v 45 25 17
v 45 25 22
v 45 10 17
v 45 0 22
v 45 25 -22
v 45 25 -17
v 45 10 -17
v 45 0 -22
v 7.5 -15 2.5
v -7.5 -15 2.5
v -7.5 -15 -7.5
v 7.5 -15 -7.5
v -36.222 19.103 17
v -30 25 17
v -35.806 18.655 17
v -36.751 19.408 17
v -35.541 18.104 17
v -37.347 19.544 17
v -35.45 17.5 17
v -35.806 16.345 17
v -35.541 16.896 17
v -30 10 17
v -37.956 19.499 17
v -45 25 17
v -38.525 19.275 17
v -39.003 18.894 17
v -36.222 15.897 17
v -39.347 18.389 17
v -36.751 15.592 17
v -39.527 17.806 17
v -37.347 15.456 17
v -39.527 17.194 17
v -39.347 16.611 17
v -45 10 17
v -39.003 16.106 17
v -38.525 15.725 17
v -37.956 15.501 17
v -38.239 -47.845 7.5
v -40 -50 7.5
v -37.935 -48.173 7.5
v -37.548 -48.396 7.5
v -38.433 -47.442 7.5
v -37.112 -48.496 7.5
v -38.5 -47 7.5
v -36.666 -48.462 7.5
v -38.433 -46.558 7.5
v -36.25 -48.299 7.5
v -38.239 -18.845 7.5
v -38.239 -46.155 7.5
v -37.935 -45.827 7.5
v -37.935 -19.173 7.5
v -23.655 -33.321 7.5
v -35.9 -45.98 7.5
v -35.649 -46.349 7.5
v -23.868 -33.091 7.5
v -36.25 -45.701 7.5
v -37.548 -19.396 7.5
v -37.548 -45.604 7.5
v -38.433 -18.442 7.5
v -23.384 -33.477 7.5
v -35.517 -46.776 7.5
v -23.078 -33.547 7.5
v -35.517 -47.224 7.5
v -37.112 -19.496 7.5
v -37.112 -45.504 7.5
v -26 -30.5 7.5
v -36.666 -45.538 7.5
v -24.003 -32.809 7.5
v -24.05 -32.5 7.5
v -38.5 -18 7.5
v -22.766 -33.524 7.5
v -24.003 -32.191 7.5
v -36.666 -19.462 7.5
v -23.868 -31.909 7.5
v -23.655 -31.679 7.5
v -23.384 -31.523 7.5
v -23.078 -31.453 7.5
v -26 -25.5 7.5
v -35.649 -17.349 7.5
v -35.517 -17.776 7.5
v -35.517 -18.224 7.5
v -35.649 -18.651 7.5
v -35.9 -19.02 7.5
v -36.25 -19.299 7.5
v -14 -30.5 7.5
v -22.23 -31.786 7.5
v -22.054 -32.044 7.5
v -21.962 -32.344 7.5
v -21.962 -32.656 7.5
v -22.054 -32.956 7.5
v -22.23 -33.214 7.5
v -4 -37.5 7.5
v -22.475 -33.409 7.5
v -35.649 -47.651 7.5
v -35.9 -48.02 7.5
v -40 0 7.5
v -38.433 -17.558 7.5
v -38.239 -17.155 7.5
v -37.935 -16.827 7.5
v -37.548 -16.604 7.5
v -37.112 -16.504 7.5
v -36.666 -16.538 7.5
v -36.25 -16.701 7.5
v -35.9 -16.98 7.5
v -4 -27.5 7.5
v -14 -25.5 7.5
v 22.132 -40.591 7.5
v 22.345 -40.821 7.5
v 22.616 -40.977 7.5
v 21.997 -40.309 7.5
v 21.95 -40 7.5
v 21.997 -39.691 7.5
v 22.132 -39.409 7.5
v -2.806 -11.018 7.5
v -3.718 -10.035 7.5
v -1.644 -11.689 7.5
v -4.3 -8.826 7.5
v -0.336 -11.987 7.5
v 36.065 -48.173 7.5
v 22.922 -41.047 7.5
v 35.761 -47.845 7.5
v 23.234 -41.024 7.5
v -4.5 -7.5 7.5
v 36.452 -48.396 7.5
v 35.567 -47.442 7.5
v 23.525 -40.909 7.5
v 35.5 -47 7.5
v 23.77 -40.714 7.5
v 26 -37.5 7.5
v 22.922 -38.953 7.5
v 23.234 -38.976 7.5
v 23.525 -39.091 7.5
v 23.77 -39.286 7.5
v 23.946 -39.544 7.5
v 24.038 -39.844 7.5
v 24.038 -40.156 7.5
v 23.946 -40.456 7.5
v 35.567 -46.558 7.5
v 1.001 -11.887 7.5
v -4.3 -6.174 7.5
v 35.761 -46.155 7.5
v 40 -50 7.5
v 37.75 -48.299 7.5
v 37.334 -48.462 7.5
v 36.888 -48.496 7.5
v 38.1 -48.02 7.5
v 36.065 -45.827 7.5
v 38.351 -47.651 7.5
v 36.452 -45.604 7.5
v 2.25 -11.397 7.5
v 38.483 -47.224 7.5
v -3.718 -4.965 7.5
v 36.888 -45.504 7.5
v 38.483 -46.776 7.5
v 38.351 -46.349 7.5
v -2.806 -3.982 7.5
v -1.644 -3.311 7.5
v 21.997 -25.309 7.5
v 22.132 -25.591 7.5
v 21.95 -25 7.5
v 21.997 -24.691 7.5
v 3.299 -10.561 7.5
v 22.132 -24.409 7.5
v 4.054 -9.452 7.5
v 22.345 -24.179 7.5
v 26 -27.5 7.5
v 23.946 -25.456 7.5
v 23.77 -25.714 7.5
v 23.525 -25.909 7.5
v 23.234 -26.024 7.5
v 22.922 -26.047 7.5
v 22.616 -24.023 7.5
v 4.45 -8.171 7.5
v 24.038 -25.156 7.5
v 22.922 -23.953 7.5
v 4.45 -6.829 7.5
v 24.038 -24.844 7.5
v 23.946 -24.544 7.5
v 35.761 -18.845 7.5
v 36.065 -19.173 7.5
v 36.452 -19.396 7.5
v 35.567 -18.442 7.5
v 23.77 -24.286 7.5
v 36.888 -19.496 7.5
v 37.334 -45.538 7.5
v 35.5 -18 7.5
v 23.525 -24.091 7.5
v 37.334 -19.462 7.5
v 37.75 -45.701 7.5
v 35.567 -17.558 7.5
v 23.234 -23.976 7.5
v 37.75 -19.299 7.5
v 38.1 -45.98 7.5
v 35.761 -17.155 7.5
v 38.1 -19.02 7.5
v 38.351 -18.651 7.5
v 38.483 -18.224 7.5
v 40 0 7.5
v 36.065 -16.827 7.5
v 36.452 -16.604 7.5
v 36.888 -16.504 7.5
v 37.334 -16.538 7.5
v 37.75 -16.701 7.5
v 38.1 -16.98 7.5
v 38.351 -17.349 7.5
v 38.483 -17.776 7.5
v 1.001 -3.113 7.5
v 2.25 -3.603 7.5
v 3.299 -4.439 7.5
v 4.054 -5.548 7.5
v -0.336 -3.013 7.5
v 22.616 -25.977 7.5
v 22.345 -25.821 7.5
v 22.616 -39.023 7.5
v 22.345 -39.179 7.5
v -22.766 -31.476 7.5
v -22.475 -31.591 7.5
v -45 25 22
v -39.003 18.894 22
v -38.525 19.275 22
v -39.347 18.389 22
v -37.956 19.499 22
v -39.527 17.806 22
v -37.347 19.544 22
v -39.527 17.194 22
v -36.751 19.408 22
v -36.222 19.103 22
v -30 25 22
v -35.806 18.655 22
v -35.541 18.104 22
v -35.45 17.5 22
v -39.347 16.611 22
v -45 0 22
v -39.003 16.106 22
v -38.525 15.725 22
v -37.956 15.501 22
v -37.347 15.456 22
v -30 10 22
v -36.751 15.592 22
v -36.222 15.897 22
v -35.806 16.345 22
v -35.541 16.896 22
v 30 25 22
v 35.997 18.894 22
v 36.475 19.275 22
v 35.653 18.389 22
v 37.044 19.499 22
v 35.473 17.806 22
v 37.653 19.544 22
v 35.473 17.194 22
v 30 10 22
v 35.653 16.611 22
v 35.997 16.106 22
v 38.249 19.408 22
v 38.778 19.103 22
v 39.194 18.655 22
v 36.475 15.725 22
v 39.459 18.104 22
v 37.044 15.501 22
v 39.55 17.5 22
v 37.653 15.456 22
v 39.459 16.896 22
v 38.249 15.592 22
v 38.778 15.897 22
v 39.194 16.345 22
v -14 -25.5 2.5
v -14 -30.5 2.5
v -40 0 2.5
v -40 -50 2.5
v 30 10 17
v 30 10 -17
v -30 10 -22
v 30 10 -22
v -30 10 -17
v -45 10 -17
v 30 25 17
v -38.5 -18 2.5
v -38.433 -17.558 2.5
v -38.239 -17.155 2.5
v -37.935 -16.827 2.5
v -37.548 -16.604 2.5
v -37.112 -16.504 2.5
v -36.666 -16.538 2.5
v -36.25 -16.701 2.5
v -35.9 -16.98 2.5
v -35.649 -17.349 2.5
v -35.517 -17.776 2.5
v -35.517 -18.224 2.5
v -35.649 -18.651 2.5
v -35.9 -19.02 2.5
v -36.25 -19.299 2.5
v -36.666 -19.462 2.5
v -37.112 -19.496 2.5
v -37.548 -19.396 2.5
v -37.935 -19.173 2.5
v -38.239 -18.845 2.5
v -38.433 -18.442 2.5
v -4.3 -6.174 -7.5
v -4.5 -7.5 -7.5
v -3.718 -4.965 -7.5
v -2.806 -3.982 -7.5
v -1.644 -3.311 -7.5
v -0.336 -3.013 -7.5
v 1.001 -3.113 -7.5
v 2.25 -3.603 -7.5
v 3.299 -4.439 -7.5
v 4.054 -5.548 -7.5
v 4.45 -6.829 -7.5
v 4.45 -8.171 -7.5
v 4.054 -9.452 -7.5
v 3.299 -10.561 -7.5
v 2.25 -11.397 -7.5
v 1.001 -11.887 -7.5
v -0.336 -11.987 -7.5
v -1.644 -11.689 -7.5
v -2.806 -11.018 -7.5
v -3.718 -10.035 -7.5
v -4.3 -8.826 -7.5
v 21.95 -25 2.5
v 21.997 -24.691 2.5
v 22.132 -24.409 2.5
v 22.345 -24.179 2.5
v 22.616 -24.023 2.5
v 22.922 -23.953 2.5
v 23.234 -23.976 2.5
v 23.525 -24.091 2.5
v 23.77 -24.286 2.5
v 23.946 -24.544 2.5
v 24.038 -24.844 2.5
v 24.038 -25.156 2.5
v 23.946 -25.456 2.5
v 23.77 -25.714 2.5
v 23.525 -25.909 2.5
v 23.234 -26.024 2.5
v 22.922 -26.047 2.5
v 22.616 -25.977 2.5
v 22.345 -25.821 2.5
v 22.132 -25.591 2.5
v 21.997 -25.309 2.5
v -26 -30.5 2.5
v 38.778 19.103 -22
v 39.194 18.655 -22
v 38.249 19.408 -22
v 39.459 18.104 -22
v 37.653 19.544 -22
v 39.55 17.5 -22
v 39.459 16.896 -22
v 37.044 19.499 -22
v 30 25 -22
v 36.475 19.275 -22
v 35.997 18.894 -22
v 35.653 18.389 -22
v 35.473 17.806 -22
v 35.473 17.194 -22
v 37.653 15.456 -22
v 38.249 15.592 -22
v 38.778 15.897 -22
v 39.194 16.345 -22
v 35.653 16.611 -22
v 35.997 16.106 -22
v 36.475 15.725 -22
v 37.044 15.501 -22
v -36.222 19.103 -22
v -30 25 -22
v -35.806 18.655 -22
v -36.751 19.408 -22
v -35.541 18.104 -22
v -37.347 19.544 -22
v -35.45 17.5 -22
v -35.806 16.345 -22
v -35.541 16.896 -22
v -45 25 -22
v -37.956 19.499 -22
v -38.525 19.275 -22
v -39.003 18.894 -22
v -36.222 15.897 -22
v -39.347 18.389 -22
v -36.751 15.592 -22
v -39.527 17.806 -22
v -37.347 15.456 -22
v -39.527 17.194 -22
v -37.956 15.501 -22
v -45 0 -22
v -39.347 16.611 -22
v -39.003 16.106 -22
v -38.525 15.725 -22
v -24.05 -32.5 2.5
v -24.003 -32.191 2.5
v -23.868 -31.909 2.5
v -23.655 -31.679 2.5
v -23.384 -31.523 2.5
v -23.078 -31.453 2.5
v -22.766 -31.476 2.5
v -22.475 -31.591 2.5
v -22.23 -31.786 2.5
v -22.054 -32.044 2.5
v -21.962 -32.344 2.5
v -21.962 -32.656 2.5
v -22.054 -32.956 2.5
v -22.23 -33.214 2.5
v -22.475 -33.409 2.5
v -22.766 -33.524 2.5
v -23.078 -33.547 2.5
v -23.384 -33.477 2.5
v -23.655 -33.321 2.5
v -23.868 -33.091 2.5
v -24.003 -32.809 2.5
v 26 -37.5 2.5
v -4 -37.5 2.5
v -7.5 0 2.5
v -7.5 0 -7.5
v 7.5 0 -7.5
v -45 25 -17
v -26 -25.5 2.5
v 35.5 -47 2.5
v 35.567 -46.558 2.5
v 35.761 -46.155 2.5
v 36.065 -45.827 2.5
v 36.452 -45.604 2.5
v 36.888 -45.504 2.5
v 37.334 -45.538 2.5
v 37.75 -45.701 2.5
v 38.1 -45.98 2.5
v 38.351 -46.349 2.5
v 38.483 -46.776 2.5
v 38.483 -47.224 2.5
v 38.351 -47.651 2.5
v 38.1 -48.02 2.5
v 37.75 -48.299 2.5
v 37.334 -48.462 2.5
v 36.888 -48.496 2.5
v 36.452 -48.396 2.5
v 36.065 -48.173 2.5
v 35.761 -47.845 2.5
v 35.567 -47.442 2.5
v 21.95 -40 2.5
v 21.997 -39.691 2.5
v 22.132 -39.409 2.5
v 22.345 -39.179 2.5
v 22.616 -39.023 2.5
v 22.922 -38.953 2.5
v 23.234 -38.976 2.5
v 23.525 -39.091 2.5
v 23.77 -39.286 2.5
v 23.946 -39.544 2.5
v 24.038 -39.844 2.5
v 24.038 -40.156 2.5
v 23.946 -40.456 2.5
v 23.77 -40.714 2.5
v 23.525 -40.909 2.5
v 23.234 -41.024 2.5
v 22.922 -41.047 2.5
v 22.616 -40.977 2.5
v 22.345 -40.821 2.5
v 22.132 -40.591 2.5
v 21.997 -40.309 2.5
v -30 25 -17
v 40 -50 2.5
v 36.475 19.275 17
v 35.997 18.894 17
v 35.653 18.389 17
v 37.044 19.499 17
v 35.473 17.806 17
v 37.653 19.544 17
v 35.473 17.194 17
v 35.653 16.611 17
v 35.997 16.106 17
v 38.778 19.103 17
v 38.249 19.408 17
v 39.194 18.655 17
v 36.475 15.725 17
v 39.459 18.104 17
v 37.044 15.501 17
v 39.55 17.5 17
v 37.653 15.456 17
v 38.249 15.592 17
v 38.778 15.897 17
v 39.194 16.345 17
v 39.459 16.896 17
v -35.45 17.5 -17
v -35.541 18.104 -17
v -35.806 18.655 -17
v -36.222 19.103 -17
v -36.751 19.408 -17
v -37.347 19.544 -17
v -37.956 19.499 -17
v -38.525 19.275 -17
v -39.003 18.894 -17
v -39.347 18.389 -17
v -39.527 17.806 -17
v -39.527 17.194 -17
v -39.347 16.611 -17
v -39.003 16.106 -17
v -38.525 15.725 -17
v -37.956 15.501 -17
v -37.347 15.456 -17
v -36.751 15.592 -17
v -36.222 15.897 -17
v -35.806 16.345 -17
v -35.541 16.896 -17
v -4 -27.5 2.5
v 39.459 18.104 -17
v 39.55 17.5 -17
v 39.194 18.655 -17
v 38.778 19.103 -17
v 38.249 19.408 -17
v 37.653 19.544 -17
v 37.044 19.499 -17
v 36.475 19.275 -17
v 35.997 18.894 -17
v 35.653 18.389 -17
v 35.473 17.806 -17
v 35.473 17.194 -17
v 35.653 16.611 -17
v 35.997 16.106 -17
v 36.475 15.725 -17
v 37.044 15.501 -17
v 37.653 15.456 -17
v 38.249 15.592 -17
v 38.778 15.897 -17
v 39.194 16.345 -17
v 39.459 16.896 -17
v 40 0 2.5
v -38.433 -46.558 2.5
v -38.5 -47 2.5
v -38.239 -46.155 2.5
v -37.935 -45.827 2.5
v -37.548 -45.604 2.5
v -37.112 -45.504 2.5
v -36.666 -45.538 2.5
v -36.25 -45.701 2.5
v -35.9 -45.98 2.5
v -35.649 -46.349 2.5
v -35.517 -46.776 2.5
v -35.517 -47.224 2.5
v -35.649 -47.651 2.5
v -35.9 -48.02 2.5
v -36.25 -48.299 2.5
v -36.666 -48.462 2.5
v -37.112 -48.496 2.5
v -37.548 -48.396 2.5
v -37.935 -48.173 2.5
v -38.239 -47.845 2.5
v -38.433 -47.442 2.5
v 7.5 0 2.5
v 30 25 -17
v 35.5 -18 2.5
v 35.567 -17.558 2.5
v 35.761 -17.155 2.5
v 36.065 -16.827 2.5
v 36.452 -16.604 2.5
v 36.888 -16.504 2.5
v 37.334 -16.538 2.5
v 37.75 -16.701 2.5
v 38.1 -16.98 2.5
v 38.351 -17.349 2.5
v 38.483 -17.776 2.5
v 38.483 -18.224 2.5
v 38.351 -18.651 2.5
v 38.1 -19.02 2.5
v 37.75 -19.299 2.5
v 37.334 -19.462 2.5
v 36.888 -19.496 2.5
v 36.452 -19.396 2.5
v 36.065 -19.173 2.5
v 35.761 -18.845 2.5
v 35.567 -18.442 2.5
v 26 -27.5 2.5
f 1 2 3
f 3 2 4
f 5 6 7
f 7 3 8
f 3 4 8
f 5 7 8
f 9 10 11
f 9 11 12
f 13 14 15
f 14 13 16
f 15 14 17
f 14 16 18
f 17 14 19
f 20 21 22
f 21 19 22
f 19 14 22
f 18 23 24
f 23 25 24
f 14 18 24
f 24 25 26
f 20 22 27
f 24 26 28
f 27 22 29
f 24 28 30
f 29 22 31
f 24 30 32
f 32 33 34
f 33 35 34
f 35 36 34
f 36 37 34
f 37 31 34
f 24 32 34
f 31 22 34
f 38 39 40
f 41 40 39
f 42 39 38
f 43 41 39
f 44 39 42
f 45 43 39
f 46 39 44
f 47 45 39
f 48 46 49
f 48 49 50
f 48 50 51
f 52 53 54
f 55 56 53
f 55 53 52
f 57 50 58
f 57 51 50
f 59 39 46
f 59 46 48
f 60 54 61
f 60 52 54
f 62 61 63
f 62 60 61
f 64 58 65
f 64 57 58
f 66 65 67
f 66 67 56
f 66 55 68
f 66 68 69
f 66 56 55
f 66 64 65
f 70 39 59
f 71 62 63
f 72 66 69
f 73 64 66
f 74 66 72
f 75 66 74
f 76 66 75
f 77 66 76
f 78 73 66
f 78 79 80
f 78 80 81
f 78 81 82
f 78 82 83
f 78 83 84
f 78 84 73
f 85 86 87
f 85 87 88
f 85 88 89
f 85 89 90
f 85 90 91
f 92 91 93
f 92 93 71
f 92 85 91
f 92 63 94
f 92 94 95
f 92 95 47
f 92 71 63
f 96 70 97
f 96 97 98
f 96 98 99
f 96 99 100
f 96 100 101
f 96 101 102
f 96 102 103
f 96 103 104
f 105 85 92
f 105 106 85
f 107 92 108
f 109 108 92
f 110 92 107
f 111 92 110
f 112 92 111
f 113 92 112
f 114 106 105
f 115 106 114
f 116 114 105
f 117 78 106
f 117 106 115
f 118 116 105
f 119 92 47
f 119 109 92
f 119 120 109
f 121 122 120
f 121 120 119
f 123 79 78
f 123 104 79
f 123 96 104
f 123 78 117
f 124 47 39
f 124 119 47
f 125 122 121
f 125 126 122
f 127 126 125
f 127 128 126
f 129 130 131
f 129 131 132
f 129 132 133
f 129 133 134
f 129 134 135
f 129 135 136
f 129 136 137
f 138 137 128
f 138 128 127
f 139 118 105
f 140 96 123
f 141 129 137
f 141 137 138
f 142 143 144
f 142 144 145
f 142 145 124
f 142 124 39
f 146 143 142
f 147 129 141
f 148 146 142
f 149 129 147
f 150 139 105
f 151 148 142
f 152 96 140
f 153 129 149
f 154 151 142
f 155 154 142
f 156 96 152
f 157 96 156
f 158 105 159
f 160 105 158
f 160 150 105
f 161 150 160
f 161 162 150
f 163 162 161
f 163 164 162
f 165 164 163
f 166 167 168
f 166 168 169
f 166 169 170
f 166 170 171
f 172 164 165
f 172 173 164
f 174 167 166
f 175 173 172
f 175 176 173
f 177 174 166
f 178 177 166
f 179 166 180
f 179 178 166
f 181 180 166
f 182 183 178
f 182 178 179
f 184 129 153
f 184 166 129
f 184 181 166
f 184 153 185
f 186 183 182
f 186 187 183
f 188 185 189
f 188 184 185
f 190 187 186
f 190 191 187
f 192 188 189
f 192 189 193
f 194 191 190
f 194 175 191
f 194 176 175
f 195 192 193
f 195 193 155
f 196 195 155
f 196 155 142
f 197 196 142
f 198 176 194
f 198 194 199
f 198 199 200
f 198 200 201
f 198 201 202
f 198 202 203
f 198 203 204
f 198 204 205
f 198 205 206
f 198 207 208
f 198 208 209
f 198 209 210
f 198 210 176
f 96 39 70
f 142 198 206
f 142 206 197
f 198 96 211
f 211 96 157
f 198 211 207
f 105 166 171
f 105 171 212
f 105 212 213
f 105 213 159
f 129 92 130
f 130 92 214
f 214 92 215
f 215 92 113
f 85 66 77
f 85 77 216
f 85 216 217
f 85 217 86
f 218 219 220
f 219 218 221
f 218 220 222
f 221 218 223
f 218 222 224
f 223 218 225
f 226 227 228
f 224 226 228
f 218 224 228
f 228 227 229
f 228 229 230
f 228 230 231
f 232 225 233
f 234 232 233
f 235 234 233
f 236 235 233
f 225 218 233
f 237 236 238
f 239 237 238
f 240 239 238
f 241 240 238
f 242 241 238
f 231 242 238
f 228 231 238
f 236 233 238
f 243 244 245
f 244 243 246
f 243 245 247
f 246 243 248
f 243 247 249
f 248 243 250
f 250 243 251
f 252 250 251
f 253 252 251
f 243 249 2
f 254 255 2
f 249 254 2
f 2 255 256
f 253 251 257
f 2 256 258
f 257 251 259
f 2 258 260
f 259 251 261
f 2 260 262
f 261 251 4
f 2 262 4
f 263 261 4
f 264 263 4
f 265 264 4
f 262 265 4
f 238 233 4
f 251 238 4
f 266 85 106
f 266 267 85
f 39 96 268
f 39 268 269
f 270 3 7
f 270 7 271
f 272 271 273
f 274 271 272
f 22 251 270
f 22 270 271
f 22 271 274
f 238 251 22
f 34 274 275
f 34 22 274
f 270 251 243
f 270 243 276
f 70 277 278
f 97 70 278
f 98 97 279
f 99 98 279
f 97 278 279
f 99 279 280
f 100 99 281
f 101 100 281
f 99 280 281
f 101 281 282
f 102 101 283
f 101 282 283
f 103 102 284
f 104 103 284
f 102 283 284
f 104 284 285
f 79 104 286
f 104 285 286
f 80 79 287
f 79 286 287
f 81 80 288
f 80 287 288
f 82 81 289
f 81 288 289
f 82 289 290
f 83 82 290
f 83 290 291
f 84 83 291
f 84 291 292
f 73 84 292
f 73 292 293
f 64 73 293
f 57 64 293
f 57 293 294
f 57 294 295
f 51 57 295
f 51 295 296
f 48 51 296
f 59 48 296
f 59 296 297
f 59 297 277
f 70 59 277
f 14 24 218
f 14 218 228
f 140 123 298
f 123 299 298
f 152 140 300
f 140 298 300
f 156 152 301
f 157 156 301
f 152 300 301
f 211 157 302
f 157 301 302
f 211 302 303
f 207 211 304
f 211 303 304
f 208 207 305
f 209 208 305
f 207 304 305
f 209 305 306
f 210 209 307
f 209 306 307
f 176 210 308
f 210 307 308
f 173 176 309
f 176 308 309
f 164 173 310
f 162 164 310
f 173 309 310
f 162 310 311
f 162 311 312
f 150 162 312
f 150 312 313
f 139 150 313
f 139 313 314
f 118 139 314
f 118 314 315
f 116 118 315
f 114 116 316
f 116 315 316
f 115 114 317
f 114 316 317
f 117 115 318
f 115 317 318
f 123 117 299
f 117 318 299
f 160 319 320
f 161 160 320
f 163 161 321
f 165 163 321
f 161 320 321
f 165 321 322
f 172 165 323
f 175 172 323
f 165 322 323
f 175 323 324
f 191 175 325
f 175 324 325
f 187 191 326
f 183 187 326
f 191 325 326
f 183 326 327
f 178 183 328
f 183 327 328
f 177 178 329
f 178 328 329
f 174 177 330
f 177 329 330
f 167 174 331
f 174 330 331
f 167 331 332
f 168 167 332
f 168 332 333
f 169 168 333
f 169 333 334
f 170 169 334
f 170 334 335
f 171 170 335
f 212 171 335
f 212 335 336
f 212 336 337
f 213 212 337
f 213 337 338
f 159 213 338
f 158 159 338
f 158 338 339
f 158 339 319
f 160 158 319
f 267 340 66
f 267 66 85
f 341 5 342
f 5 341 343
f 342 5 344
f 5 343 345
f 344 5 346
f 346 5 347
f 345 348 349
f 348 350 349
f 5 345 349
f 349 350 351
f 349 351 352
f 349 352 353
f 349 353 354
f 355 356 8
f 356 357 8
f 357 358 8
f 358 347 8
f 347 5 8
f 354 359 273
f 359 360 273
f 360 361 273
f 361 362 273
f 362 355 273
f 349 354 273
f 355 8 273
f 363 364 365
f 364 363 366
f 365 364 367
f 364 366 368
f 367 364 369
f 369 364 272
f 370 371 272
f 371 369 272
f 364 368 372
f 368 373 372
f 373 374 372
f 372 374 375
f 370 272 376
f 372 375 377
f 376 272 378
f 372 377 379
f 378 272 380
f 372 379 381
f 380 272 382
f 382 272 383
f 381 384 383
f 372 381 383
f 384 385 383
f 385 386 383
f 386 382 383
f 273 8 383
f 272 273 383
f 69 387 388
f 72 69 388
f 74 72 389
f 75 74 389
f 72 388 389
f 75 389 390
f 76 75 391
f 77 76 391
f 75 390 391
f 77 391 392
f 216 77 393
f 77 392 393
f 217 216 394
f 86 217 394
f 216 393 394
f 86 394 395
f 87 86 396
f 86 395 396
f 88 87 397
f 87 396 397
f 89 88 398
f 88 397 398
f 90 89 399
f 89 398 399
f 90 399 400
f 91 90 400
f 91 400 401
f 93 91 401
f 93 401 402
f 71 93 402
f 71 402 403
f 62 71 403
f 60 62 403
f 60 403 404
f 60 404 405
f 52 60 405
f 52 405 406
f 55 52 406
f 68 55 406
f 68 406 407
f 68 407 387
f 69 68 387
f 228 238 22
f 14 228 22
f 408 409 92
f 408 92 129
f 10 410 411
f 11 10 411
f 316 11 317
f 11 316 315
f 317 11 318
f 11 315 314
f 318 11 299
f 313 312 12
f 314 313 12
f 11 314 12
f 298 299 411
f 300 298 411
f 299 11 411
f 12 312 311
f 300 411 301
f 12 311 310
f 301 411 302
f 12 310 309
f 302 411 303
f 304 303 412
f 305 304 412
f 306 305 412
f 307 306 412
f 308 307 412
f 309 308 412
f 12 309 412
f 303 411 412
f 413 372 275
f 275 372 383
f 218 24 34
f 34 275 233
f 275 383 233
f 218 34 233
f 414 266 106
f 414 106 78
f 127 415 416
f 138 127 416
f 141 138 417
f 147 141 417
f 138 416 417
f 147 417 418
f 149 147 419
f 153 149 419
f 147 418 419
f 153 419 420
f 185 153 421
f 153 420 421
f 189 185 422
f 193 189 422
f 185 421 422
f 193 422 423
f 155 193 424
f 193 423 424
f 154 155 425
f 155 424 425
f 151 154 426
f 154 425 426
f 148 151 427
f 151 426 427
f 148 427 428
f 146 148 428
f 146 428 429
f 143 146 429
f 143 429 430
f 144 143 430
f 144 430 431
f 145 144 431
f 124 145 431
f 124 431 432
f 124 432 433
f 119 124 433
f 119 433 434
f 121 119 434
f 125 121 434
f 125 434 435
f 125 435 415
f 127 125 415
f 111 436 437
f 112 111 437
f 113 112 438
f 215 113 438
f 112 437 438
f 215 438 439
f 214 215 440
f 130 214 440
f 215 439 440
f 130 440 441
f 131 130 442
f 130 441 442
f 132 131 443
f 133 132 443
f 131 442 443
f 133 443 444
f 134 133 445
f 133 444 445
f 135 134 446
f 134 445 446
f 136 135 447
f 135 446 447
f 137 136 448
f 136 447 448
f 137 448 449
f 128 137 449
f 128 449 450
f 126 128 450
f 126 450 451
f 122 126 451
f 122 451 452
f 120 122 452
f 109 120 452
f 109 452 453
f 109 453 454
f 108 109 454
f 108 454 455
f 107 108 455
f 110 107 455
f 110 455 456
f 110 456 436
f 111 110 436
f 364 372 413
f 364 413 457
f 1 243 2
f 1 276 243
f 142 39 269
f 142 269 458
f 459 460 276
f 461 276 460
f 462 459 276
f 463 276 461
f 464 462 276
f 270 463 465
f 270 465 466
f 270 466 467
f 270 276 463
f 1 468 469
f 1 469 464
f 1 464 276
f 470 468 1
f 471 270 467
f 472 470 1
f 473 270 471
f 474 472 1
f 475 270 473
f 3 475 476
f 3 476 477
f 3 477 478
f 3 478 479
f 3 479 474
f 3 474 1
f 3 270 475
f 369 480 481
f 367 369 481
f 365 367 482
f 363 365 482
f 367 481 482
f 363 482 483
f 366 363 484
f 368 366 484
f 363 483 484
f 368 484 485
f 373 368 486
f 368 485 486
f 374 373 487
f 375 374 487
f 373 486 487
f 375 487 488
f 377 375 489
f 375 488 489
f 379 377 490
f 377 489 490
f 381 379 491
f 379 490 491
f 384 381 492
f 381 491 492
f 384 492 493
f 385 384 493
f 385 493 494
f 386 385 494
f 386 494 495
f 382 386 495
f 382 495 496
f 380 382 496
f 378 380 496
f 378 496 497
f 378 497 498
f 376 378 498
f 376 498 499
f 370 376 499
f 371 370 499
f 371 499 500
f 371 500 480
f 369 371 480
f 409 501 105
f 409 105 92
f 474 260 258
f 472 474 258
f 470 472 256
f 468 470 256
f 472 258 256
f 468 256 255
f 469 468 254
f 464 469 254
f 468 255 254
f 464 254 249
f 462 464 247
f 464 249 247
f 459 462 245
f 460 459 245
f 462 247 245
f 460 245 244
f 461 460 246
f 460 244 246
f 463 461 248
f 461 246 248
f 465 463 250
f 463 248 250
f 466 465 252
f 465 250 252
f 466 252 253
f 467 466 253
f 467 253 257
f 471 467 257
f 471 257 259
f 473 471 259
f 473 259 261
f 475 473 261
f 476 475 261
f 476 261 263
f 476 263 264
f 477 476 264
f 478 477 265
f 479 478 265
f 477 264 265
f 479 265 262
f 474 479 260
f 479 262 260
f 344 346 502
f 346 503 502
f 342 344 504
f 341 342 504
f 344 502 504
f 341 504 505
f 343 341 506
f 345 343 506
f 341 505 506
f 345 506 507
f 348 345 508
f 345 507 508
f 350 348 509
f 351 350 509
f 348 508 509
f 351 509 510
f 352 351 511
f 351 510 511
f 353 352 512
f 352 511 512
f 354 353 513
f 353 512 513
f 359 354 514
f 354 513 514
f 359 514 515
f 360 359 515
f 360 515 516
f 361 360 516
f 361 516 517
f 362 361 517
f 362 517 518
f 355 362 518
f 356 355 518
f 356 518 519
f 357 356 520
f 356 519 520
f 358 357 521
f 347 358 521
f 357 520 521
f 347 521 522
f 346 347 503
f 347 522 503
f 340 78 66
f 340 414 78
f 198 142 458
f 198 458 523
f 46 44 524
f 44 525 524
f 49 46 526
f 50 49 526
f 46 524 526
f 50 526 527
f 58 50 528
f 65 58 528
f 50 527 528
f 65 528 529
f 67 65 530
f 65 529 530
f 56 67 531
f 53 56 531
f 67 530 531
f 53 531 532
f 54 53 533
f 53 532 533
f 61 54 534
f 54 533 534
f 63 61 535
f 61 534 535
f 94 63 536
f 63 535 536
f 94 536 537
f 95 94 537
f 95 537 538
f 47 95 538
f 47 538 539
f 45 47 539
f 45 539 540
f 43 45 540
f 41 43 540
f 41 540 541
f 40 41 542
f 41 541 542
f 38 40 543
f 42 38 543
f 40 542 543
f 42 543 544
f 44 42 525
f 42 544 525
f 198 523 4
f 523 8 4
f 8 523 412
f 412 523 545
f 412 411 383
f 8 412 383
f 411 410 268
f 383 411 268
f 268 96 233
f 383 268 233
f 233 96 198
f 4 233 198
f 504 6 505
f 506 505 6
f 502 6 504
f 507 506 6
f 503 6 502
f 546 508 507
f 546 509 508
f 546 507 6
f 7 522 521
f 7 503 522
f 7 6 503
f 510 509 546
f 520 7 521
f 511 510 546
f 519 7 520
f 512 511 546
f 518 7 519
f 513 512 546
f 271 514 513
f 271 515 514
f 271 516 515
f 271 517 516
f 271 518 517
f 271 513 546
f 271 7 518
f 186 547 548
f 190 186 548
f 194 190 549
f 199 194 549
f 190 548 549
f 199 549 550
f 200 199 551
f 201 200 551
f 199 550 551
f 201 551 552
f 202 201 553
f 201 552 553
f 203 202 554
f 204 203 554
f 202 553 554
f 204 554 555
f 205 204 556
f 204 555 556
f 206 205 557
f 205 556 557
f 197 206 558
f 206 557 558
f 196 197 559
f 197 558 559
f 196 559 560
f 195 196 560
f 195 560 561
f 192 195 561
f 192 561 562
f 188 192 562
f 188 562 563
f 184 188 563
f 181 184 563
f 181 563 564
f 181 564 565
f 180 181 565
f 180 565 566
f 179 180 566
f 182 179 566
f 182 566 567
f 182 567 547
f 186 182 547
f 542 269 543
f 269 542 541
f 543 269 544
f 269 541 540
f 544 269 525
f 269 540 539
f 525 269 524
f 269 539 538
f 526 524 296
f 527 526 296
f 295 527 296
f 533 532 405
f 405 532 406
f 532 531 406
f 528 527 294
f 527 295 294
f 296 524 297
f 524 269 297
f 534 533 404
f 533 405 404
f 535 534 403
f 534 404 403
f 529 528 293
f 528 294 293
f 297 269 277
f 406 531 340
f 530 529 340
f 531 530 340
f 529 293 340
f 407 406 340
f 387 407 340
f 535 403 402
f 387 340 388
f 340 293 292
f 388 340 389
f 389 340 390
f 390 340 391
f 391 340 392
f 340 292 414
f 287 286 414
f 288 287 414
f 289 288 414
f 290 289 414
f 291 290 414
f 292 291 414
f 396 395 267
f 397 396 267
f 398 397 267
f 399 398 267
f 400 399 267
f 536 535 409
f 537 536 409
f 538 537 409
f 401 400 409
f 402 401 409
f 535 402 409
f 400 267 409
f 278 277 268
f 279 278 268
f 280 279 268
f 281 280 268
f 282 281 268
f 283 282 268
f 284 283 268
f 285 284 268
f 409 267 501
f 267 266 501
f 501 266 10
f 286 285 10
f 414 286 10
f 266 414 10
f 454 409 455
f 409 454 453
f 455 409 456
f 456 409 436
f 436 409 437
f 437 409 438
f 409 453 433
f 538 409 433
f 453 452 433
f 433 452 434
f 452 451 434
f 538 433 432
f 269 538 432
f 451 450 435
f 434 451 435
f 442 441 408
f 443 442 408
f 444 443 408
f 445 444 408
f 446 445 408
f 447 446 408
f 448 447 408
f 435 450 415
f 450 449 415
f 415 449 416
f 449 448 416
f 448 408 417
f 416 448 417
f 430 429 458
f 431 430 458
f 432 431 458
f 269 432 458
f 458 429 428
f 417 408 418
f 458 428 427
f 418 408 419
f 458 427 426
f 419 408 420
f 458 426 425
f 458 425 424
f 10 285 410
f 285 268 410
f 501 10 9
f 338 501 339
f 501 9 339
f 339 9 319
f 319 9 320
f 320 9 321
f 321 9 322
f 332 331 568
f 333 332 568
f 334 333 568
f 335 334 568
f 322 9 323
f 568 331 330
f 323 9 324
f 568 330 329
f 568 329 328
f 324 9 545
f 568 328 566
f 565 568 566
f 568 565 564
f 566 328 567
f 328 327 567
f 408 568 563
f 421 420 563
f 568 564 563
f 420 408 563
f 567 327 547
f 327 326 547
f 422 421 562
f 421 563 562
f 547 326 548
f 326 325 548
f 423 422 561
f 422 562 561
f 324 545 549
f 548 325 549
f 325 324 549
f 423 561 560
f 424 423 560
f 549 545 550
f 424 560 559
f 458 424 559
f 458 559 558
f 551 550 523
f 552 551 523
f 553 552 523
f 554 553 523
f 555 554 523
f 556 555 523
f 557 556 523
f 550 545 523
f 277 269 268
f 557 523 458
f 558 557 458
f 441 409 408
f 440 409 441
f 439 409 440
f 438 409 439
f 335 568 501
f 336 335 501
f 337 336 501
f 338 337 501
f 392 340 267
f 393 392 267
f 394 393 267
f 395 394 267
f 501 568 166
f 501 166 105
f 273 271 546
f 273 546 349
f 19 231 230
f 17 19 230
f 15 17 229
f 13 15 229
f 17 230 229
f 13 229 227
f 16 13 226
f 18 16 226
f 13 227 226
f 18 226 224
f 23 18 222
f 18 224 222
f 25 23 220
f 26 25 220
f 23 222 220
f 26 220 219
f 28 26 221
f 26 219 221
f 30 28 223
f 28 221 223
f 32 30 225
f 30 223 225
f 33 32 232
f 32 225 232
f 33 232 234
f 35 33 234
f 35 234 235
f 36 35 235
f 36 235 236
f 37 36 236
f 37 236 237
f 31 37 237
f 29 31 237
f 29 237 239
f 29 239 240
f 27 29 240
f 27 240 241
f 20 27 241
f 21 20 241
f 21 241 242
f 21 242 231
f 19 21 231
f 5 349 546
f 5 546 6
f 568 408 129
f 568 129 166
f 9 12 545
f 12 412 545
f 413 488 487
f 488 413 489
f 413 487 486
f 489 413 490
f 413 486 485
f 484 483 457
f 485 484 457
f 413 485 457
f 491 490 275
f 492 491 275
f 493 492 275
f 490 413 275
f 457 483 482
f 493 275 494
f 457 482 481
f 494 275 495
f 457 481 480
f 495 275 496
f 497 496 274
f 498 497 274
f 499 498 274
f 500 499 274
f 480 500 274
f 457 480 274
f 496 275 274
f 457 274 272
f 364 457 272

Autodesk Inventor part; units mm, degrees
ref_plane "YZ Plane" through (0, 0, 0) normal (1, 0, 0) x (0, 1, 0)
ref_plane "XZ Plane" through (0, 0, 0) normal (0, 1, 0) x (-1, 0, 0)
ref_plane "XY Plane" through (0, 0, 0) normal (0, 0, 1) x (1, 0, 0)
sketch "Sketch1" plane through (0, 0, 0) normal (0, 1, 0) x (-1, 0, 0)
  line L0 (45, 22) -> (-45, 22)
  line L1 (-45, 22) -> (-45, -22)
  line L2 (-45, -22) -> (45, -22)
  line L3 (45, -22) -> (45, 22)
  line L4 (45, 22) -> (-45, -22) construction
  line L5 (-45, 22) -> (45, -22) construction
  point P0 (0, 0)
  dimension "d0" = 90
  dimension "d1" = 44
extrude "Extrusion1" add sketch "Sketch1" along normal blind 10
sketch "Sketch2" plane through (0, 10, 0) normal (0, 1, 0) x (1, 0, 0)
  line L0 (45, -22) -> (30, -22)
  line L1 (30, -22) -> (30, -17)
  line L2 (30, -17) -> (45, -17)
  line L3 (45, -17) -> (45, -22)
  line L4 (45, 17) -> (30, 17)
  line L5 (30, 17) -> (30, 22)
  line L6 (30, 22) -> (45, 22)
  line L7 (45, 22) -> (45, 17)
  line L8 (-45, -22) -> (-30, -22)
  line L9 (-30, -22) -> (-30, -17)
  line L10 (-30, -17) -> (-45, -17)
  line L11 (-45, -17) -> (-45, -22)
  line L12 (-45, 17) -> (-30, 17)
  line L13 (-30, 17) -> (-30, 22)
  line L14 (-30, 22) -> (-45, 22)
  line L15 (-45, 22) -> (-45, 17)
  line L16 (-45, 22) -> (-45, -22) projected
  line L17 (-45, -22) -> (45, -22) projected
  line L18 (45, 22) -> (-45, 22) projected
  line L19 (45, -22) -> (45, 22) projected
  point P0 (0, 0)
  dimension "d4" = 5
  dimension "d5" = 5
  dimension "d6" = 5
  dimension "d7" = 5
  dimension "d8" = 15
  dimension "d9" = 15
  dimension "d10" = 15
  dimension "d11" = 15
extrude "Extrusion2" add sketch "Sketch2" along normal blind 15 contours L0 L1 L2 L3 | L8 L11 L10 L9 | L4 L5 L6 L7 | L15 L14 L13 L12
sketch "Sketch3" plane through (-45, 0, 22) normal (0, 0, 1) x (1, 0, 0)
  circle A0 centre (82.5, 17.5) radius 2.05
  circle A1 centre (7.5, 17.5) radius 2.05
  line L0 (75, 25) -> (90, 25) projected
  line L1 (90, 0) -> (90, 25) projected
  line L2 (0, 25) -> (15, 25) projected
  line L3 (15, 10) -> (15, 25) projected
  point P0 (45, 0)
  point P1 (15, 17.5)
  dimension "d14" = 4.1
  dimension "d15" = 4.1
  dimension "d16" = 7.5
  dimension "d17" = 7.5
  dimension "d18" = 7.5
  dimension "d19" = 7.5
extrude "Extrusion3" cut sketch "Sketch3" against normal through all
sketch "Sketch6" plane through (0, 0, 0) normal (0, -1, 0) x (1, 0, 0)
  line L0 (-7.5, -7.5) -> (7.5, -7.5)
  line L1 (7.5, -7.5) -> (7.5, 7.5)
  line L2 (7.5, 7.5) -> (-7.5, 7.5)
  line L3 (-7.5, 7.5) -> (-7.5, -7.5)
  line L4 (-7.5, -7.5) -> (7.5, 7.5) construction
  line L5 (7.5, -7.5) -> (-7.5, 7.5) construction
  point P0 (0, 0)
  dimension "d27" = 15
  dimension "d28" = 15
extrude "Extrusion5" add sketch "Sketch6" along normal blind 15
sketch "Sketch7" plane through (7.5, 0, -7.5) normal (0, 0, -1) x (-1, 0, 0)
  circle A0 centre (7.5, -7.5) radius 4.5
  line L0 (-37.5, 0) -> (52.5, 0) projected
  line L1 (0, 0) -> (0, -15) projected
  point P0 (7.5, 0)
  dimension "d31" = 9
  dimension "d32" = 7.5
  dimension "d33" = 7.5
extrude "Extrusion6" cut sketch "Sketch7" against normal through all
sketch "Sketch8" plane through (-7.5, 0, 7.5) normal (0, 0, 1) x (1, 0, 0)
  line L0 (47.5, 0) -> (-32.5, 0)
  line L1 (-32.5, 0) -> (-32.5, -50)
  line L2 (-32.5, -50) -> (47.5, -50)
  line L3 (47.5, -50) -> (47.5, 0)
  line L4 (-37.5, 0) -> (52.5, 0) projected
  line L5 (0, 0) -> (0, -15) projected
  line L6 (15, -15) -> (0, -15) projected
  line L7 (15, 0) -> (15, -15) projected
  circle A0 centre (7.5, -7.5) radius 4.5 projected
  line L8 (0, 0) -> (15, 0) projected
  line L9 (0, 0) -> (0, -15) projected
  line L10 (15, -15) -> (0, -15) projected
  line L11 (15, 0) -> (15, -15) projected
  point P0 (7.5, 0)
  point P1 (7.5, 0)
  dimension "d36" = 50
  dimension "d37" = 80
  dimension "d38" = 40
extrude "Extrusion7" add sketch "Sketch8" against normal blind 5 contours L3 L2 L1 L0 L5 L6 L7
sketch "Sketch10" plane through (-7.5, 0, 2.5) normal (0, 0, -1) x (-1, 0, 0)
  circle A0 centre (29.5, -47) radius 1.5
  circle A1 centre (-44.5, -47) radius 1.5
  circle A2 centre (29.5, -18) radius 1.5
  circle A3 centre (-44.5, -18) radius 1.5
  line L0 (-47.5, -50) -> (32.5, -50) projected
  line L1 (-47.5, 0) -> (-47.5, -50) projected
  line L2 (32.5, -50) -> (32.5, 0) projected
  point P0 (-7.5, 0)
  dimension "d58" = 3
  dimension "d59" = 3
  dimension "d60" = 3
  dimension "d61" = 3
  dimension "d62" = 3
  dimension "d63" = 3
  dimension "d64" = 3
  dimension "d65" = 3
  dimension "d66" = 29
  dimension "d67" = 29
  dimension "d68" = 3
  dimension "d69" = 3
extrude "Extrusion9" cut sketch "Sketch10" against normal blind 5
sketch "Sketch11" plane through (-7.5, 0, 2.5) normal (0, 0, -1) x (-1, 0, 0)
  circle A0 centre (-30.5, -40) radius 1.05
  circle A1 centre (15.5, -32.5) radius 1.05
  circle A2 centre (-30.5, -25) radius 1.05
  line L0 (-47.5, 0) -> (-47.5, -50) projected
  line L1 (-47.5, -50) -> (32.5, -50) projected
  point P0 (-7.5, 0)
  dimension "d75" = 2.1
  dimension "d76" = 2.1
  dimension "d77" = 2.1
  dimension "d78" = 46
  dimension "d79" = 7.5
  dimension "d80" = 7.5
  dimension "d81" = 17
  dimension "d82" = 0
  dimension "d83" = 10
extrude "Extrusion10" cut sketch "Sketch11" against normal through all
sketch "Sketch12" plane through (-7.5, 0, 2.5) normal (0, 0, -1) x (-1, 0, 0)
  line L0 (-3.5, -37.5) -> (-33.5, -37.5)
  line L1 (-33.5, -37.5) -> (-33.5, -27.5)
  line L2 (-33.5, -27.5) -> (-3.5, -27.5)
  line L3 (-3.5, -27.5) -> (-3.5, -37.5)
  line L4 (0, -15) -> (-15, -15) projected
  line L5 (-47.5, 0) -> (-47.5, -50) projected
  point P0 (-7.5, 0)
  dimension "d86" = 30
  dimension "d87" = 10
  dimension "d88" = 12.5
  dimension "d89" = 14
extrude "Extrusion11" cut sketch "Sketch12" against normal blind 10
sketch "Sketch13" plane through (-7.5, 0, 2.5) normal (0, 0, -1) x (-1, 0, 0)
  line L0 (18.5, -30.5) -> (6.5, -30.5)
  line L1 (6.5, -30.5) -> (6.5, -25.5)
  line L2 (6.5, -25.5) -> (18.5, -25.5)
  line L3 (18.5, -25.5) -> (18.5, -30.5)
  circle A0 centre (15.5, -32.5) radius 1.05 projected
  line L4 (-3.5, -27.5) -> (-3.5, -37.5) projected
  point P0 (-7.5, 0)
  dimension "d92" = 5
  dimension "d93" = 2
  dimension "d94" = 3
  dimension "d97" = 12
extrude "Extrusion12" cut sketch "Sketch13" against normal through all contours L0 L1 L2 L3
properties part number "rail_top" material "ABS Plastic"
